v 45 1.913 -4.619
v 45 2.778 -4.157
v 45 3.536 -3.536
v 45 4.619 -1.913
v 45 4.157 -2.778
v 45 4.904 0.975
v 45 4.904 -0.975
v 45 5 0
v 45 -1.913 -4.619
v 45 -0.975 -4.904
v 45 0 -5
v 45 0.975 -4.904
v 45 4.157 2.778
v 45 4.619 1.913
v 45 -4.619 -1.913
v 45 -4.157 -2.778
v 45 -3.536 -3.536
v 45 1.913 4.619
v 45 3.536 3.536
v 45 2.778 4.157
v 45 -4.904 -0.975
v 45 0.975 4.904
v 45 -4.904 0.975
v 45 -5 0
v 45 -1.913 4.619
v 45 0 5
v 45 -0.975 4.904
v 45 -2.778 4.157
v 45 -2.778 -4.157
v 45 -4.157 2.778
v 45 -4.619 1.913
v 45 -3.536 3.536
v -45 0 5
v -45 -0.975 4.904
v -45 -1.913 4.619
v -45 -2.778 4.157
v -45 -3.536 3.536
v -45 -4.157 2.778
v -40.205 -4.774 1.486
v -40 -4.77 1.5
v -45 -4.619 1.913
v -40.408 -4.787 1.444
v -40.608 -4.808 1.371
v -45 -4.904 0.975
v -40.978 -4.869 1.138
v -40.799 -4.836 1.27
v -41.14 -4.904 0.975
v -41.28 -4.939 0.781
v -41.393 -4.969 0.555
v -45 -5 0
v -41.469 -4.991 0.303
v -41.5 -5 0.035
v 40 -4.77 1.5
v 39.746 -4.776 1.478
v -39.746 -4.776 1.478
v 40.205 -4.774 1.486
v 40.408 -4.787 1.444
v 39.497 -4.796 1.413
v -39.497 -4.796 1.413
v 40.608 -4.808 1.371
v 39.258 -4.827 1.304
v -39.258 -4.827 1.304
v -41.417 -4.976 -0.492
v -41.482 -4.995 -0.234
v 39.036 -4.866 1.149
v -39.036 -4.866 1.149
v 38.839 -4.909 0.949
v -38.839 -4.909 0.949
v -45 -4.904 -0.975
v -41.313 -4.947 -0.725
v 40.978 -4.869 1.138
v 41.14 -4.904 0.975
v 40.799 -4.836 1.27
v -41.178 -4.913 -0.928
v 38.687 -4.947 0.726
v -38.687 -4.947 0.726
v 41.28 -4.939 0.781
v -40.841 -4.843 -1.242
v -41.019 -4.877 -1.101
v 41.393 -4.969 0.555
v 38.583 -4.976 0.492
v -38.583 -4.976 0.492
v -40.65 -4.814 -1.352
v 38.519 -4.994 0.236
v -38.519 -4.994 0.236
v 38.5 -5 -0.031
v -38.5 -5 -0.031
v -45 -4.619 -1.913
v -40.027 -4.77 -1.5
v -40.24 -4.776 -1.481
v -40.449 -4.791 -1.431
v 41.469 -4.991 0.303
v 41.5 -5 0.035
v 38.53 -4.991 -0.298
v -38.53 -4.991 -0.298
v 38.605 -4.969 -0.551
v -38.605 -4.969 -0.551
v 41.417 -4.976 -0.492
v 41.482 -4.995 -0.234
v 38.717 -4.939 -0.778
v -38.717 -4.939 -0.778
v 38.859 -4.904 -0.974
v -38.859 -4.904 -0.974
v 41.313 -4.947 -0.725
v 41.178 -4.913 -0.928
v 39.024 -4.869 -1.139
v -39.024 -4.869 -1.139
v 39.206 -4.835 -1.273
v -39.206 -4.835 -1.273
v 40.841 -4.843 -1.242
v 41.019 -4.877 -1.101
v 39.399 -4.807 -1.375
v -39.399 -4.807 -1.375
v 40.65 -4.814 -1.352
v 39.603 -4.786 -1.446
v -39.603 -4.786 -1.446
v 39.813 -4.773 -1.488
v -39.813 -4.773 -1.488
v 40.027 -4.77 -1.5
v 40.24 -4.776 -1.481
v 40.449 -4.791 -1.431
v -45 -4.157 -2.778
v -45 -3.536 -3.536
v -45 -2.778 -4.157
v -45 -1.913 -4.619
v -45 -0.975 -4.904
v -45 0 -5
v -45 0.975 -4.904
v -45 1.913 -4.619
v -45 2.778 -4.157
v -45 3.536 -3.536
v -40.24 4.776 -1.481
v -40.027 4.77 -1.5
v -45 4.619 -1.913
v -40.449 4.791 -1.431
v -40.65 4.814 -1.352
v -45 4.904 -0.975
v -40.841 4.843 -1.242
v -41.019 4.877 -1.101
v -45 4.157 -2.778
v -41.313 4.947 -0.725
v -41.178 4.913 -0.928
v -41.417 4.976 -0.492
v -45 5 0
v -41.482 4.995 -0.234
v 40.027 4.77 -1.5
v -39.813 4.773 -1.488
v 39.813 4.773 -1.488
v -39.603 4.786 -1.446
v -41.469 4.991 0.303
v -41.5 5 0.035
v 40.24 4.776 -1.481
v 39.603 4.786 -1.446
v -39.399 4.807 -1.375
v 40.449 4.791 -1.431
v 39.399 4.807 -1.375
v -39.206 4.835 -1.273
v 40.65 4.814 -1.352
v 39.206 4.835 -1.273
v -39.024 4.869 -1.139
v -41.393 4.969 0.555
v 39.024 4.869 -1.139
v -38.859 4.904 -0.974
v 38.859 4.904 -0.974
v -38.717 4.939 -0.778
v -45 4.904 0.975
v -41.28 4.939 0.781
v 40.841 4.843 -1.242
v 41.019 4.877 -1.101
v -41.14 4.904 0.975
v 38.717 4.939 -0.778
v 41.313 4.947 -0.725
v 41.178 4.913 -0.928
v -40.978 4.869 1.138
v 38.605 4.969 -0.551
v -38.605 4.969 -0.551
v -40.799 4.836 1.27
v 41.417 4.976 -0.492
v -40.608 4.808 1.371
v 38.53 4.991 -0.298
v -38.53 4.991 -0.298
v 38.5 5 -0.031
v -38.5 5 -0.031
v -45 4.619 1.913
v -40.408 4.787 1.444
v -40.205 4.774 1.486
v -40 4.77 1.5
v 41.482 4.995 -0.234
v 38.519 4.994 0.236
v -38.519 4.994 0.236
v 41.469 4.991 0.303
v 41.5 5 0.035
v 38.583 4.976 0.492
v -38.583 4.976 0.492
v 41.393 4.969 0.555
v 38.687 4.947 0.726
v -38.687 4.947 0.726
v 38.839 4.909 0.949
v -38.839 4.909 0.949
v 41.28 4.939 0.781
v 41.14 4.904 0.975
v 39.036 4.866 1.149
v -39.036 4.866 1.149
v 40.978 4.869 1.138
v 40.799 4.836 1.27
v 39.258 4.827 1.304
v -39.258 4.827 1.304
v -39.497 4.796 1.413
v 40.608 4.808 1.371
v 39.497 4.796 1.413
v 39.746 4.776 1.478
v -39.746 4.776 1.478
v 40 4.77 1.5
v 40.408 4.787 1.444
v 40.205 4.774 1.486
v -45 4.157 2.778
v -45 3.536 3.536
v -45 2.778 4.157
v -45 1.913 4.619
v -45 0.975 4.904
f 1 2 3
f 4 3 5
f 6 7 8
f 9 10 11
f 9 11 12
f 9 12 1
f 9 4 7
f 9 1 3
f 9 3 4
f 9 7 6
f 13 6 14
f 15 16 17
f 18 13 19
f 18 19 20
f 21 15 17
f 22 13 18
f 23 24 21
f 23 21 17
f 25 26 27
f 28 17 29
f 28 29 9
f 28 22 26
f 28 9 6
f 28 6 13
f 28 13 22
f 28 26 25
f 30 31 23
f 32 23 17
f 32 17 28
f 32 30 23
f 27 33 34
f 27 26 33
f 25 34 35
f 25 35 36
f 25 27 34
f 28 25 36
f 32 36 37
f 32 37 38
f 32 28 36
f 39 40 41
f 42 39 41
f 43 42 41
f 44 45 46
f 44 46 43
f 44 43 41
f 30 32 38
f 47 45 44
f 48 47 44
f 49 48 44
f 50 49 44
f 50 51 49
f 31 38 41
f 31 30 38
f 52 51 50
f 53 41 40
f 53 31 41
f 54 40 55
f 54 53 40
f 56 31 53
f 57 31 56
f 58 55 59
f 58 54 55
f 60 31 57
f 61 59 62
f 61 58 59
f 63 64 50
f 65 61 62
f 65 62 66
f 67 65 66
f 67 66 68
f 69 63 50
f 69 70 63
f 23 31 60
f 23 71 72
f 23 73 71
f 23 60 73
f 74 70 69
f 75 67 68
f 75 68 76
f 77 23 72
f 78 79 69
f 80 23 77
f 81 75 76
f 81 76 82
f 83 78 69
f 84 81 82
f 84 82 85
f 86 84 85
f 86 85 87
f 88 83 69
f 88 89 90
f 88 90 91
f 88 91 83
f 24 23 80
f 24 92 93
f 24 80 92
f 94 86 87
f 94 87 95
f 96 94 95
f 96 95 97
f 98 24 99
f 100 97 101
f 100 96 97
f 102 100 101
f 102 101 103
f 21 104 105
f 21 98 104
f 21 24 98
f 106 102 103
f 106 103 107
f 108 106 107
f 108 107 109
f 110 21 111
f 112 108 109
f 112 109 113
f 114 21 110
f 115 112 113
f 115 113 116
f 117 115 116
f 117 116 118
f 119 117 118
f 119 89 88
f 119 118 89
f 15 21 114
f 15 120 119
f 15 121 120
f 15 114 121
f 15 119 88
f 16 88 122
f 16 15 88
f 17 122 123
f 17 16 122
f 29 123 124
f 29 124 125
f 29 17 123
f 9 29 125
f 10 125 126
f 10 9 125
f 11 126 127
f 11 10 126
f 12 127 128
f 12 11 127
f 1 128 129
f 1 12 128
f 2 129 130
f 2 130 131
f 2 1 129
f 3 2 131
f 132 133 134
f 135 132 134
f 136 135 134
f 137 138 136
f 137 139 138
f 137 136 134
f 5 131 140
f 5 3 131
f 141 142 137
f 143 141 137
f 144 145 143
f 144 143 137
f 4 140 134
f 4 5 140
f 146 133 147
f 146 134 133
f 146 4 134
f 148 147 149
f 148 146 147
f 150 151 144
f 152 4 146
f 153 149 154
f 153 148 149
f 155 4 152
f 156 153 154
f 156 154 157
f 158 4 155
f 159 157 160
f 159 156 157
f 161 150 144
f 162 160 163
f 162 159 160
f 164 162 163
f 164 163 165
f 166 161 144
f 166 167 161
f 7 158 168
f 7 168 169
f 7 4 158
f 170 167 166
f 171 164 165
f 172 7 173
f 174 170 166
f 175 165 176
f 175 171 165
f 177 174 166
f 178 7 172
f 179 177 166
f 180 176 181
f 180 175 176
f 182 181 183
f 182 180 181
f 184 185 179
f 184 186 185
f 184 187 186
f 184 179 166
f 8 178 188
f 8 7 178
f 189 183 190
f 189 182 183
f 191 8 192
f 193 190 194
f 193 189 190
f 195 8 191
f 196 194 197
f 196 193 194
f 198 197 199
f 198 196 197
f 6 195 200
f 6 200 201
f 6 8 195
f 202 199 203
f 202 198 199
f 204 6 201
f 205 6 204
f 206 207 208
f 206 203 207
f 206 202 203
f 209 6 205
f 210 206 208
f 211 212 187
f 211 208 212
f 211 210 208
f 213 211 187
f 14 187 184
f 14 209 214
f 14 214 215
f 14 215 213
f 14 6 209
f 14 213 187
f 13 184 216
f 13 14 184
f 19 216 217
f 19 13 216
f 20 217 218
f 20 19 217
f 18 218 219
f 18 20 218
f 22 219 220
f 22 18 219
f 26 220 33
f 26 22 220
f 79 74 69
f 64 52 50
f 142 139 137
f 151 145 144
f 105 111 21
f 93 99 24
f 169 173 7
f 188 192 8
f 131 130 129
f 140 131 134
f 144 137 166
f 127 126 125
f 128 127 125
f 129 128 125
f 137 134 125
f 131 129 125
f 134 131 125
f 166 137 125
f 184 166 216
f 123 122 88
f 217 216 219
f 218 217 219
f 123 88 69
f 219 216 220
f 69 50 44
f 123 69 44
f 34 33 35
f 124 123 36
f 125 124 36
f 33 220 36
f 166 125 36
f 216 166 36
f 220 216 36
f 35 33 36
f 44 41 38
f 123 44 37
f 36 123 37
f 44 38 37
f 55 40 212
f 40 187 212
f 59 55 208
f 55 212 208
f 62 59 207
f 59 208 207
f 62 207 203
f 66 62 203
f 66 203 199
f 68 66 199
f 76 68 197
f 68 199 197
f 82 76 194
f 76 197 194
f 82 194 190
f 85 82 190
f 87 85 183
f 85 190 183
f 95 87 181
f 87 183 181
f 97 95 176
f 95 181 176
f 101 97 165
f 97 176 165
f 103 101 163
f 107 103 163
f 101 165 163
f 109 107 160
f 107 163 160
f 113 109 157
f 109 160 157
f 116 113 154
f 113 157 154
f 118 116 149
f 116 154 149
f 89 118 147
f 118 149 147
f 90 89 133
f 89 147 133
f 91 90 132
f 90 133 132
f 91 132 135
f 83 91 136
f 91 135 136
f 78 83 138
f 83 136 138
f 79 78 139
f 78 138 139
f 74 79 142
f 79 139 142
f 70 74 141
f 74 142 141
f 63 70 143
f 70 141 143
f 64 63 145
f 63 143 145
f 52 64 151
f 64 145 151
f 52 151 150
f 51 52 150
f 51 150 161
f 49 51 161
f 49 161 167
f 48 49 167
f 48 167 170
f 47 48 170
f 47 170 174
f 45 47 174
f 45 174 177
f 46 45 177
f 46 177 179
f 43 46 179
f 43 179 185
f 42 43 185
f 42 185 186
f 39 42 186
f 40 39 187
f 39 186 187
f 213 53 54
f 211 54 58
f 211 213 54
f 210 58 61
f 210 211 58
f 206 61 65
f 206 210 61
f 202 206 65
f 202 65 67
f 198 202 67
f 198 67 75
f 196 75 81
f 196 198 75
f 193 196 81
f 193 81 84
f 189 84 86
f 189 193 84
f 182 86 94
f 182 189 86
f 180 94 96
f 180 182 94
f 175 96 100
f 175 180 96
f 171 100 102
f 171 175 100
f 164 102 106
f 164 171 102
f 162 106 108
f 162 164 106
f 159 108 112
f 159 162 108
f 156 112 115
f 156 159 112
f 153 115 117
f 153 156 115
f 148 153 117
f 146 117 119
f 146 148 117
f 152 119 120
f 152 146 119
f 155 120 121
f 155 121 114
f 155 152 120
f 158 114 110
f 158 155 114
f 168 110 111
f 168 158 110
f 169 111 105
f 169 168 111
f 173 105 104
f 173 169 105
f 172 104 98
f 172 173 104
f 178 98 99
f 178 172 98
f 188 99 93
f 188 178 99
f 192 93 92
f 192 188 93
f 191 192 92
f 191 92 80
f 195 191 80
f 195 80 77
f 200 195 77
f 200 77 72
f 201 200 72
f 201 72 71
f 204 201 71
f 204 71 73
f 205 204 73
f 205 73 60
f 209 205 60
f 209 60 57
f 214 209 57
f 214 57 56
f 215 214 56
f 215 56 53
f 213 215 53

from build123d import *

# Parameters (mm, degrees)
SKETCH1_R           = 5
BOSS_EXTRUDE1_DEPTH = 45
SKETCH4_R           = 1.5
CUT_EXTRUDE1_DEPTH  = 46.552167896


with BuildPart() as part:
    # Sketch1 → Boss-Extrude1 (new, symmetric)
    with BuildSketch(Plane(origin=(0, 0, 0), x_dir=(0, 0, -1), z_dir=(1, 0, 0))):
        Circle(SKETCH1_R)
    extrude(amount=BOSS_EXTRUDE1_DEPTH, both=True)

    # Sketch4 → Cut-Extrude1 (cut, symmetric)
    with BuildSketch(Plane(origin=(0, 0, 0), x_dir=(1, 0, 0), z_dir=(0, 1, 0))):
        with Locations((-40, 0)):
            Circle(SKETCH4_R)
    cut_extrude1 = extrude(amount=CUT_EXTRUDE1_DEPTH, both=True, mode=Mode.SUBTRACT)

    # Mirror1: Cut-Extrude1 across plane
    add(cut_extrude1.mirror(Plane(origin=(0, 0, 0), x_dir=(0, 0, 1), z_dir=(1, 0, 0))), mode=Mode.SUBTRACT)


solid = part.part
